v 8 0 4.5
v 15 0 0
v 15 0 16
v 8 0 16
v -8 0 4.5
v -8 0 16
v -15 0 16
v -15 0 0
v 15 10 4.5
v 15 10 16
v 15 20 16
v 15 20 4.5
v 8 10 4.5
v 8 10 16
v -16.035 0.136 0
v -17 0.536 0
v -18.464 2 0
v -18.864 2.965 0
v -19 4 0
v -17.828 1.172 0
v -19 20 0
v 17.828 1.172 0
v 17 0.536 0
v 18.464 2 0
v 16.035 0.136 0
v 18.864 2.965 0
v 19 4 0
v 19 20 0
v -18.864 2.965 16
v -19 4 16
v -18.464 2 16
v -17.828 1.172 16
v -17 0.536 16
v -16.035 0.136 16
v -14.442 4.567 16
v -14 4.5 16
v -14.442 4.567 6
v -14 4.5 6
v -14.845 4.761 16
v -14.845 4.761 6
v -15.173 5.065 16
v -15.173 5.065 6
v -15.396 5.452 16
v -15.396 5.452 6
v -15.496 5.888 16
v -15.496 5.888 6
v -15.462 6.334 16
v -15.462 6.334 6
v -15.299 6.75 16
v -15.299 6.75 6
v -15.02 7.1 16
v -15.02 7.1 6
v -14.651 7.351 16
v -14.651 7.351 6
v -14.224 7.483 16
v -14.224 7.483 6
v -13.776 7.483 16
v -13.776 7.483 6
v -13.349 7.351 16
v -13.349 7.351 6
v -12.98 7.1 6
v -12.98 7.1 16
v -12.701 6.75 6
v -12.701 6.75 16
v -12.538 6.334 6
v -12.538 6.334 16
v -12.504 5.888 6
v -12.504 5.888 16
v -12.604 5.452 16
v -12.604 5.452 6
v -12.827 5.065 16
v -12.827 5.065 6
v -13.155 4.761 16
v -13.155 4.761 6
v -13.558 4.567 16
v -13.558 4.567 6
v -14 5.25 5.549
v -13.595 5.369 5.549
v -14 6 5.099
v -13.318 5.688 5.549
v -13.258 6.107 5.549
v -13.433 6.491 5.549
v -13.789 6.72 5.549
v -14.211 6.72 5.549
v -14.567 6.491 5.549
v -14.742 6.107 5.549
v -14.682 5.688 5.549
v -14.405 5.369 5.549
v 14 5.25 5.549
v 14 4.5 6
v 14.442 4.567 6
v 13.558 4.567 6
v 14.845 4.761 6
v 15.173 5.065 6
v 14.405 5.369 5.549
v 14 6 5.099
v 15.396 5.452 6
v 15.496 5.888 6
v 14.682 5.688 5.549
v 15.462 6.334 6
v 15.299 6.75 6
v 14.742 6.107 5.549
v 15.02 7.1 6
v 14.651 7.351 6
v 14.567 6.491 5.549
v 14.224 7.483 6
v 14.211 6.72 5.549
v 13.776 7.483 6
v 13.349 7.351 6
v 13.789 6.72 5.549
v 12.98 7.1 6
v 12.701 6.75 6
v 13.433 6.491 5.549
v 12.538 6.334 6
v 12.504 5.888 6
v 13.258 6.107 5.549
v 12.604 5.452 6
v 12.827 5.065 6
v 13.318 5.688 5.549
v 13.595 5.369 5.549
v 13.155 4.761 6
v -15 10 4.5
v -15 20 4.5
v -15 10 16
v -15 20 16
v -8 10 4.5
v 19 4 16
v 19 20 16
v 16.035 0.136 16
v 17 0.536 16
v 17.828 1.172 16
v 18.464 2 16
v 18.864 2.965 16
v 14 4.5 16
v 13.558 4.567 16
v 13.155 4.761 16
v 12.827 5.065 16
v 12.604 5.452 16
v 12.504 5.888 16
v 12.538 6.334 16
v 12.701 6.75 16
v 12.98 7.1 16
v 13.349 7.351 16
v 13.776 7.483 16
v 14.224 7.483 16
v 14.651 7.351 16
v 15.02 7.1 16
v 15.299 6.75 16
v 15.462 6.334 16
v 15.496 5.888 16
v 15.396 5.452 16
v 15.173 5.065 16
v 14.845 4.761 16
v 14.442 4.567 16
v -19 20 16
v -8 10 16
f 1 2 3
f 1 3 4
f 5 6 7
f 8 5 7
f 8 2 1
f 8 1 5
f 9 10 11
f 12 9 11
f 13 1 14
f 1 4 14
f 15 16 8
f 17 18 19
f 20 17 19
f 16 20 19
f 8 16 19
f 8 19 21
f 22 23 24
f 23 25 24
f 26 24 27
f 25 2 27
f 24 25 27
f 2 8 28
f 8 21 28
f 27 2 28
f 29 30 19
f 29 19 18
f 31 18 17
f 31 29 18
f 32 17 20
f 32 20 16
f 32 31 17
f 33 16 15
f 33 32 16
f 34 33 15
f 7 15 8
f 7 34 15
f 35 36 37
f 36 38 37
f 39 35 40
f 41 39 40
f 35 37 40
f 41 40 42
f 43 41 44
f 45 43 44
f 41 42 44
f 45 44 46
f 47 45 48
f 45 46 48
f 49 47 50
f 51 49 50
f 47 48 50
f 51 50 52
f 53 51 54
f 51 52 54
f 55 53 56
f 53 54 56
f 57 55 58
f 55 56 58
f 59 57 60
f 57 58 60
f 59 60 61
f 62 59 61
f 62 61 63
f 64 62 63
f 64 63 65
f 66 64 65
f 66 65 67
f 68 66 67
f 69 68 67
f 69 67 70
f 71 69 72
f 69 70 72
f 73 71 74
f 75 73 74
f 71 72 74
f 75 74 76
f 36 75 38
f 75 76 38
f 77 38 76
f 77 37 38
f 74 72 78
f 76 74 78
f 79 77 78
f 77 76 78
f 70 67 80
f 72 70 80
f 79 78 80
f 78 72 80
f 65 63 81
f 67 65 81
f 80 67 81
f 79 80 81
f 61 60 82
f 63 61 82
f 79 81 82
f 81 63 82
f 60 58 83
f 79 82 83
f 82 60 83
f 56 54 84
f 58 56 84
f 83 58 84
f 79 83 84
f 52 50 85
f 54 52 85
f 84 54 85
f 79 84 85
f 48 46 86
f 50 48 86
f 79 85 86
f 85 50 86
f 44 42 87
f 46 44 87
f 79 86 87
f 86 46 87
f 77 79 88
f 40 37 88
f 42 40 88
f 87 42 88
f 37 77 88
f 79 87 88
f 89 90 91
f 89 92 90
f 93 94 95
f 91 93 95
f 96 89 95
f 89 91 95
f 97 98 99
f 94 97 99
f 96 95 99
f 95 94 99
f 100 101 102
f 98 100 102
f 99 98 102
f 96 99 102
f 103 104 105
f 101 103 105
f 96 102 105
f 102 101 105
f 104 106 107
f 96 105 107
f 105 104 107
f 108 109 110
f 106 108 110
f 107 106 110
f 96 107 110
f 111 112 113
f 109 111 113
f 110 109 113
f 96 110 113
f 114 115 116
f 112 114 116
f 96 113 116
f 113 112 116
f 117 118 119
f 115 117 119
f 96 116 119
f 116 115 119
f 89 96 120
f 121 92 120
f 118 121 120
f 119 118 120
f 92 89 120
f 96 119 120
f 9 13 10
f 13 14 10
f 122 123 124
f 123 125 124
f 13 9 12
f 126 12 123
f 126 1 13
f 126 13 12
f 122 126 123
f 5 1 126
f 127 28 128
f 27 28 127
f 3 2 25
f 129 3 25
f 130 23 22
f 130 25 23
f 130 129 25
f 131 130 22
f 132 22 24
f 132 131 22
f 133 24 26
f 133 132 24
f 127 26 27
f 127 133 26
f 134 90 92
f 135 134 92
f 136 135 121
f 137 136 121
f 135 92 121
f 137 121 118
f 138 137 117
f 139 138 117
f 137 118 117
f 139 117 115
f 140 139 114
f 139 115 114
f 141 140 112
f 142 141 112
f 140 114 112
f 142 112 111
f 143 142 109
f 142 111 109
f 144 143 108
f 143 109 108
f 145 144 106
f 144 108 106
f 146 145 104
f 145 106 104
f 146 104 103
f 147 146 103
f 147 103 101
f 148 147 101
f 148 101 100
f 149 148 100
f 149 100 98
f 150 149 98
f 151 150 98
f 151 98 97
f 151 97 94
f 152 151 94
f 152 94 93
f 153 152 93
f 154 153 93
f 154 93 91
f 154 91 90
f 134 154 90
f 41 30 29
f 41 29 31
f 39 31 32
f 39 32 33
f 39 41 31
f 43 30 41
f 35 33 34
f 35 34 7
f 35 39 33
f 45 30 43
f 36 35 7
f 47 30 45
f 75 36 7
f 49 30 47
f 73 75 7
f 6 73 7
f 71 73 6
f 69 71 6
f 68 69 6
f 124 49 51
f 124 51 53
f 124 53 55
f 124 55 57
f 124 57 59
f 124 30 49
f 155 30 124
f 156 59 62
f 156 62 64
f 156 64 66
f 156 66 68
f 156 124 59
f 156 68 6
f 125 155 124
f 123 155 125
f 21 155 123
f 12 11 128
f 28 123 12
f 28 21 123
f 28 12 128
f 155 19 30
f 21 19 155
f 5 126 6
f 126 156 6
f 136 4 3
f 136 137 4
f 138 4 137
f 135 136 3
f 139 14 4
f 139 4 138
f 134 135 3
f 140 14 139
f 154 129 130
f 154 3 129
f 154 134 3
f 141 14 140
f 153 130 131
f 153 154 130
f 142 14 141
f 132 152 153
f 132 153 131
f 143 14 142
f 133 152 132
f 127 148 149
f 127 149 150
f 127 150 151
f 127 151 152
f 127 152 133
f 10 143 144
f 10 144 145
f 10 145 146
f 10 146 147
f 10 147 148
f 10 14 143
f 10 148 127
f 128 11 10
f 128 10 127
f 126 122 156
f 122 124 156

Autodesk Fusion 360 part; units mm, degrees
sketch "スケッチ1" plane through (0, 0, 0) normal (0, 0, 1) x (1, 0, 0)
  line L0 (-19, 20) -> (19, 20)
  line L1 (19, 20) -> (19, 0)
  line L2 (19, 0) -> (-19, 0)
  line L3 (-19, 0) -> (-19, 20)
  dimension "d1" = 38
  dimension "d2" = 20
extrude "押し出し1" add sketch "スケッチ1" along normal blind 16
sketch "スケッチ2" plane through (0, 0, 16) normal (0, 0, 1) x (-1, 0, 0)
  line L0 (19, 0) -> (-19, 0)
  line L1 (-19, 0) -> (-19, -20)
  line L2 (-19, -20) -> (19, -20)
  line L3 (19, -20) -> (19, 0)
  line L4 (8, 0) -> (-8, 0)
  line L5 (-8, 0) -> (-8, -10)
  line L6 (-8, -10) -> (-15, -10)
  line L7 (-15, -10) -> (-15, -20)
  line L8 (15, -20) -> (15, -10)
  line L9 (15, -10) -> (8, -10)
  line L10 (8, -10) -> (8, 0)
  line L11 (14, -6) -> (-14, -6)
  point P0 (0, -6)
  dimension "d5" = 16
  dimension "d6" = 4
  dimension "d7" = 4
  dimension "d8" = 10
  dimension "d9" = 6
  dimension "d10" = 28
extrude "押し出し2" cut sketch "スケッチ2" against normal blind 11.5 contours L0 L4 L5 L10 L11 | L2 L5 L6 L7 L8 L9 L10 L11
hole "穴1" at (-14, 6, 16) at (14, 6, 16) direction (0, 0, -1) diameter 3 depth 10 tip angle 118
thread "ねじ1"
fillet "フィレット1" radius 4 2 edges at (19, 0, 8) (-19, 0, 8)
